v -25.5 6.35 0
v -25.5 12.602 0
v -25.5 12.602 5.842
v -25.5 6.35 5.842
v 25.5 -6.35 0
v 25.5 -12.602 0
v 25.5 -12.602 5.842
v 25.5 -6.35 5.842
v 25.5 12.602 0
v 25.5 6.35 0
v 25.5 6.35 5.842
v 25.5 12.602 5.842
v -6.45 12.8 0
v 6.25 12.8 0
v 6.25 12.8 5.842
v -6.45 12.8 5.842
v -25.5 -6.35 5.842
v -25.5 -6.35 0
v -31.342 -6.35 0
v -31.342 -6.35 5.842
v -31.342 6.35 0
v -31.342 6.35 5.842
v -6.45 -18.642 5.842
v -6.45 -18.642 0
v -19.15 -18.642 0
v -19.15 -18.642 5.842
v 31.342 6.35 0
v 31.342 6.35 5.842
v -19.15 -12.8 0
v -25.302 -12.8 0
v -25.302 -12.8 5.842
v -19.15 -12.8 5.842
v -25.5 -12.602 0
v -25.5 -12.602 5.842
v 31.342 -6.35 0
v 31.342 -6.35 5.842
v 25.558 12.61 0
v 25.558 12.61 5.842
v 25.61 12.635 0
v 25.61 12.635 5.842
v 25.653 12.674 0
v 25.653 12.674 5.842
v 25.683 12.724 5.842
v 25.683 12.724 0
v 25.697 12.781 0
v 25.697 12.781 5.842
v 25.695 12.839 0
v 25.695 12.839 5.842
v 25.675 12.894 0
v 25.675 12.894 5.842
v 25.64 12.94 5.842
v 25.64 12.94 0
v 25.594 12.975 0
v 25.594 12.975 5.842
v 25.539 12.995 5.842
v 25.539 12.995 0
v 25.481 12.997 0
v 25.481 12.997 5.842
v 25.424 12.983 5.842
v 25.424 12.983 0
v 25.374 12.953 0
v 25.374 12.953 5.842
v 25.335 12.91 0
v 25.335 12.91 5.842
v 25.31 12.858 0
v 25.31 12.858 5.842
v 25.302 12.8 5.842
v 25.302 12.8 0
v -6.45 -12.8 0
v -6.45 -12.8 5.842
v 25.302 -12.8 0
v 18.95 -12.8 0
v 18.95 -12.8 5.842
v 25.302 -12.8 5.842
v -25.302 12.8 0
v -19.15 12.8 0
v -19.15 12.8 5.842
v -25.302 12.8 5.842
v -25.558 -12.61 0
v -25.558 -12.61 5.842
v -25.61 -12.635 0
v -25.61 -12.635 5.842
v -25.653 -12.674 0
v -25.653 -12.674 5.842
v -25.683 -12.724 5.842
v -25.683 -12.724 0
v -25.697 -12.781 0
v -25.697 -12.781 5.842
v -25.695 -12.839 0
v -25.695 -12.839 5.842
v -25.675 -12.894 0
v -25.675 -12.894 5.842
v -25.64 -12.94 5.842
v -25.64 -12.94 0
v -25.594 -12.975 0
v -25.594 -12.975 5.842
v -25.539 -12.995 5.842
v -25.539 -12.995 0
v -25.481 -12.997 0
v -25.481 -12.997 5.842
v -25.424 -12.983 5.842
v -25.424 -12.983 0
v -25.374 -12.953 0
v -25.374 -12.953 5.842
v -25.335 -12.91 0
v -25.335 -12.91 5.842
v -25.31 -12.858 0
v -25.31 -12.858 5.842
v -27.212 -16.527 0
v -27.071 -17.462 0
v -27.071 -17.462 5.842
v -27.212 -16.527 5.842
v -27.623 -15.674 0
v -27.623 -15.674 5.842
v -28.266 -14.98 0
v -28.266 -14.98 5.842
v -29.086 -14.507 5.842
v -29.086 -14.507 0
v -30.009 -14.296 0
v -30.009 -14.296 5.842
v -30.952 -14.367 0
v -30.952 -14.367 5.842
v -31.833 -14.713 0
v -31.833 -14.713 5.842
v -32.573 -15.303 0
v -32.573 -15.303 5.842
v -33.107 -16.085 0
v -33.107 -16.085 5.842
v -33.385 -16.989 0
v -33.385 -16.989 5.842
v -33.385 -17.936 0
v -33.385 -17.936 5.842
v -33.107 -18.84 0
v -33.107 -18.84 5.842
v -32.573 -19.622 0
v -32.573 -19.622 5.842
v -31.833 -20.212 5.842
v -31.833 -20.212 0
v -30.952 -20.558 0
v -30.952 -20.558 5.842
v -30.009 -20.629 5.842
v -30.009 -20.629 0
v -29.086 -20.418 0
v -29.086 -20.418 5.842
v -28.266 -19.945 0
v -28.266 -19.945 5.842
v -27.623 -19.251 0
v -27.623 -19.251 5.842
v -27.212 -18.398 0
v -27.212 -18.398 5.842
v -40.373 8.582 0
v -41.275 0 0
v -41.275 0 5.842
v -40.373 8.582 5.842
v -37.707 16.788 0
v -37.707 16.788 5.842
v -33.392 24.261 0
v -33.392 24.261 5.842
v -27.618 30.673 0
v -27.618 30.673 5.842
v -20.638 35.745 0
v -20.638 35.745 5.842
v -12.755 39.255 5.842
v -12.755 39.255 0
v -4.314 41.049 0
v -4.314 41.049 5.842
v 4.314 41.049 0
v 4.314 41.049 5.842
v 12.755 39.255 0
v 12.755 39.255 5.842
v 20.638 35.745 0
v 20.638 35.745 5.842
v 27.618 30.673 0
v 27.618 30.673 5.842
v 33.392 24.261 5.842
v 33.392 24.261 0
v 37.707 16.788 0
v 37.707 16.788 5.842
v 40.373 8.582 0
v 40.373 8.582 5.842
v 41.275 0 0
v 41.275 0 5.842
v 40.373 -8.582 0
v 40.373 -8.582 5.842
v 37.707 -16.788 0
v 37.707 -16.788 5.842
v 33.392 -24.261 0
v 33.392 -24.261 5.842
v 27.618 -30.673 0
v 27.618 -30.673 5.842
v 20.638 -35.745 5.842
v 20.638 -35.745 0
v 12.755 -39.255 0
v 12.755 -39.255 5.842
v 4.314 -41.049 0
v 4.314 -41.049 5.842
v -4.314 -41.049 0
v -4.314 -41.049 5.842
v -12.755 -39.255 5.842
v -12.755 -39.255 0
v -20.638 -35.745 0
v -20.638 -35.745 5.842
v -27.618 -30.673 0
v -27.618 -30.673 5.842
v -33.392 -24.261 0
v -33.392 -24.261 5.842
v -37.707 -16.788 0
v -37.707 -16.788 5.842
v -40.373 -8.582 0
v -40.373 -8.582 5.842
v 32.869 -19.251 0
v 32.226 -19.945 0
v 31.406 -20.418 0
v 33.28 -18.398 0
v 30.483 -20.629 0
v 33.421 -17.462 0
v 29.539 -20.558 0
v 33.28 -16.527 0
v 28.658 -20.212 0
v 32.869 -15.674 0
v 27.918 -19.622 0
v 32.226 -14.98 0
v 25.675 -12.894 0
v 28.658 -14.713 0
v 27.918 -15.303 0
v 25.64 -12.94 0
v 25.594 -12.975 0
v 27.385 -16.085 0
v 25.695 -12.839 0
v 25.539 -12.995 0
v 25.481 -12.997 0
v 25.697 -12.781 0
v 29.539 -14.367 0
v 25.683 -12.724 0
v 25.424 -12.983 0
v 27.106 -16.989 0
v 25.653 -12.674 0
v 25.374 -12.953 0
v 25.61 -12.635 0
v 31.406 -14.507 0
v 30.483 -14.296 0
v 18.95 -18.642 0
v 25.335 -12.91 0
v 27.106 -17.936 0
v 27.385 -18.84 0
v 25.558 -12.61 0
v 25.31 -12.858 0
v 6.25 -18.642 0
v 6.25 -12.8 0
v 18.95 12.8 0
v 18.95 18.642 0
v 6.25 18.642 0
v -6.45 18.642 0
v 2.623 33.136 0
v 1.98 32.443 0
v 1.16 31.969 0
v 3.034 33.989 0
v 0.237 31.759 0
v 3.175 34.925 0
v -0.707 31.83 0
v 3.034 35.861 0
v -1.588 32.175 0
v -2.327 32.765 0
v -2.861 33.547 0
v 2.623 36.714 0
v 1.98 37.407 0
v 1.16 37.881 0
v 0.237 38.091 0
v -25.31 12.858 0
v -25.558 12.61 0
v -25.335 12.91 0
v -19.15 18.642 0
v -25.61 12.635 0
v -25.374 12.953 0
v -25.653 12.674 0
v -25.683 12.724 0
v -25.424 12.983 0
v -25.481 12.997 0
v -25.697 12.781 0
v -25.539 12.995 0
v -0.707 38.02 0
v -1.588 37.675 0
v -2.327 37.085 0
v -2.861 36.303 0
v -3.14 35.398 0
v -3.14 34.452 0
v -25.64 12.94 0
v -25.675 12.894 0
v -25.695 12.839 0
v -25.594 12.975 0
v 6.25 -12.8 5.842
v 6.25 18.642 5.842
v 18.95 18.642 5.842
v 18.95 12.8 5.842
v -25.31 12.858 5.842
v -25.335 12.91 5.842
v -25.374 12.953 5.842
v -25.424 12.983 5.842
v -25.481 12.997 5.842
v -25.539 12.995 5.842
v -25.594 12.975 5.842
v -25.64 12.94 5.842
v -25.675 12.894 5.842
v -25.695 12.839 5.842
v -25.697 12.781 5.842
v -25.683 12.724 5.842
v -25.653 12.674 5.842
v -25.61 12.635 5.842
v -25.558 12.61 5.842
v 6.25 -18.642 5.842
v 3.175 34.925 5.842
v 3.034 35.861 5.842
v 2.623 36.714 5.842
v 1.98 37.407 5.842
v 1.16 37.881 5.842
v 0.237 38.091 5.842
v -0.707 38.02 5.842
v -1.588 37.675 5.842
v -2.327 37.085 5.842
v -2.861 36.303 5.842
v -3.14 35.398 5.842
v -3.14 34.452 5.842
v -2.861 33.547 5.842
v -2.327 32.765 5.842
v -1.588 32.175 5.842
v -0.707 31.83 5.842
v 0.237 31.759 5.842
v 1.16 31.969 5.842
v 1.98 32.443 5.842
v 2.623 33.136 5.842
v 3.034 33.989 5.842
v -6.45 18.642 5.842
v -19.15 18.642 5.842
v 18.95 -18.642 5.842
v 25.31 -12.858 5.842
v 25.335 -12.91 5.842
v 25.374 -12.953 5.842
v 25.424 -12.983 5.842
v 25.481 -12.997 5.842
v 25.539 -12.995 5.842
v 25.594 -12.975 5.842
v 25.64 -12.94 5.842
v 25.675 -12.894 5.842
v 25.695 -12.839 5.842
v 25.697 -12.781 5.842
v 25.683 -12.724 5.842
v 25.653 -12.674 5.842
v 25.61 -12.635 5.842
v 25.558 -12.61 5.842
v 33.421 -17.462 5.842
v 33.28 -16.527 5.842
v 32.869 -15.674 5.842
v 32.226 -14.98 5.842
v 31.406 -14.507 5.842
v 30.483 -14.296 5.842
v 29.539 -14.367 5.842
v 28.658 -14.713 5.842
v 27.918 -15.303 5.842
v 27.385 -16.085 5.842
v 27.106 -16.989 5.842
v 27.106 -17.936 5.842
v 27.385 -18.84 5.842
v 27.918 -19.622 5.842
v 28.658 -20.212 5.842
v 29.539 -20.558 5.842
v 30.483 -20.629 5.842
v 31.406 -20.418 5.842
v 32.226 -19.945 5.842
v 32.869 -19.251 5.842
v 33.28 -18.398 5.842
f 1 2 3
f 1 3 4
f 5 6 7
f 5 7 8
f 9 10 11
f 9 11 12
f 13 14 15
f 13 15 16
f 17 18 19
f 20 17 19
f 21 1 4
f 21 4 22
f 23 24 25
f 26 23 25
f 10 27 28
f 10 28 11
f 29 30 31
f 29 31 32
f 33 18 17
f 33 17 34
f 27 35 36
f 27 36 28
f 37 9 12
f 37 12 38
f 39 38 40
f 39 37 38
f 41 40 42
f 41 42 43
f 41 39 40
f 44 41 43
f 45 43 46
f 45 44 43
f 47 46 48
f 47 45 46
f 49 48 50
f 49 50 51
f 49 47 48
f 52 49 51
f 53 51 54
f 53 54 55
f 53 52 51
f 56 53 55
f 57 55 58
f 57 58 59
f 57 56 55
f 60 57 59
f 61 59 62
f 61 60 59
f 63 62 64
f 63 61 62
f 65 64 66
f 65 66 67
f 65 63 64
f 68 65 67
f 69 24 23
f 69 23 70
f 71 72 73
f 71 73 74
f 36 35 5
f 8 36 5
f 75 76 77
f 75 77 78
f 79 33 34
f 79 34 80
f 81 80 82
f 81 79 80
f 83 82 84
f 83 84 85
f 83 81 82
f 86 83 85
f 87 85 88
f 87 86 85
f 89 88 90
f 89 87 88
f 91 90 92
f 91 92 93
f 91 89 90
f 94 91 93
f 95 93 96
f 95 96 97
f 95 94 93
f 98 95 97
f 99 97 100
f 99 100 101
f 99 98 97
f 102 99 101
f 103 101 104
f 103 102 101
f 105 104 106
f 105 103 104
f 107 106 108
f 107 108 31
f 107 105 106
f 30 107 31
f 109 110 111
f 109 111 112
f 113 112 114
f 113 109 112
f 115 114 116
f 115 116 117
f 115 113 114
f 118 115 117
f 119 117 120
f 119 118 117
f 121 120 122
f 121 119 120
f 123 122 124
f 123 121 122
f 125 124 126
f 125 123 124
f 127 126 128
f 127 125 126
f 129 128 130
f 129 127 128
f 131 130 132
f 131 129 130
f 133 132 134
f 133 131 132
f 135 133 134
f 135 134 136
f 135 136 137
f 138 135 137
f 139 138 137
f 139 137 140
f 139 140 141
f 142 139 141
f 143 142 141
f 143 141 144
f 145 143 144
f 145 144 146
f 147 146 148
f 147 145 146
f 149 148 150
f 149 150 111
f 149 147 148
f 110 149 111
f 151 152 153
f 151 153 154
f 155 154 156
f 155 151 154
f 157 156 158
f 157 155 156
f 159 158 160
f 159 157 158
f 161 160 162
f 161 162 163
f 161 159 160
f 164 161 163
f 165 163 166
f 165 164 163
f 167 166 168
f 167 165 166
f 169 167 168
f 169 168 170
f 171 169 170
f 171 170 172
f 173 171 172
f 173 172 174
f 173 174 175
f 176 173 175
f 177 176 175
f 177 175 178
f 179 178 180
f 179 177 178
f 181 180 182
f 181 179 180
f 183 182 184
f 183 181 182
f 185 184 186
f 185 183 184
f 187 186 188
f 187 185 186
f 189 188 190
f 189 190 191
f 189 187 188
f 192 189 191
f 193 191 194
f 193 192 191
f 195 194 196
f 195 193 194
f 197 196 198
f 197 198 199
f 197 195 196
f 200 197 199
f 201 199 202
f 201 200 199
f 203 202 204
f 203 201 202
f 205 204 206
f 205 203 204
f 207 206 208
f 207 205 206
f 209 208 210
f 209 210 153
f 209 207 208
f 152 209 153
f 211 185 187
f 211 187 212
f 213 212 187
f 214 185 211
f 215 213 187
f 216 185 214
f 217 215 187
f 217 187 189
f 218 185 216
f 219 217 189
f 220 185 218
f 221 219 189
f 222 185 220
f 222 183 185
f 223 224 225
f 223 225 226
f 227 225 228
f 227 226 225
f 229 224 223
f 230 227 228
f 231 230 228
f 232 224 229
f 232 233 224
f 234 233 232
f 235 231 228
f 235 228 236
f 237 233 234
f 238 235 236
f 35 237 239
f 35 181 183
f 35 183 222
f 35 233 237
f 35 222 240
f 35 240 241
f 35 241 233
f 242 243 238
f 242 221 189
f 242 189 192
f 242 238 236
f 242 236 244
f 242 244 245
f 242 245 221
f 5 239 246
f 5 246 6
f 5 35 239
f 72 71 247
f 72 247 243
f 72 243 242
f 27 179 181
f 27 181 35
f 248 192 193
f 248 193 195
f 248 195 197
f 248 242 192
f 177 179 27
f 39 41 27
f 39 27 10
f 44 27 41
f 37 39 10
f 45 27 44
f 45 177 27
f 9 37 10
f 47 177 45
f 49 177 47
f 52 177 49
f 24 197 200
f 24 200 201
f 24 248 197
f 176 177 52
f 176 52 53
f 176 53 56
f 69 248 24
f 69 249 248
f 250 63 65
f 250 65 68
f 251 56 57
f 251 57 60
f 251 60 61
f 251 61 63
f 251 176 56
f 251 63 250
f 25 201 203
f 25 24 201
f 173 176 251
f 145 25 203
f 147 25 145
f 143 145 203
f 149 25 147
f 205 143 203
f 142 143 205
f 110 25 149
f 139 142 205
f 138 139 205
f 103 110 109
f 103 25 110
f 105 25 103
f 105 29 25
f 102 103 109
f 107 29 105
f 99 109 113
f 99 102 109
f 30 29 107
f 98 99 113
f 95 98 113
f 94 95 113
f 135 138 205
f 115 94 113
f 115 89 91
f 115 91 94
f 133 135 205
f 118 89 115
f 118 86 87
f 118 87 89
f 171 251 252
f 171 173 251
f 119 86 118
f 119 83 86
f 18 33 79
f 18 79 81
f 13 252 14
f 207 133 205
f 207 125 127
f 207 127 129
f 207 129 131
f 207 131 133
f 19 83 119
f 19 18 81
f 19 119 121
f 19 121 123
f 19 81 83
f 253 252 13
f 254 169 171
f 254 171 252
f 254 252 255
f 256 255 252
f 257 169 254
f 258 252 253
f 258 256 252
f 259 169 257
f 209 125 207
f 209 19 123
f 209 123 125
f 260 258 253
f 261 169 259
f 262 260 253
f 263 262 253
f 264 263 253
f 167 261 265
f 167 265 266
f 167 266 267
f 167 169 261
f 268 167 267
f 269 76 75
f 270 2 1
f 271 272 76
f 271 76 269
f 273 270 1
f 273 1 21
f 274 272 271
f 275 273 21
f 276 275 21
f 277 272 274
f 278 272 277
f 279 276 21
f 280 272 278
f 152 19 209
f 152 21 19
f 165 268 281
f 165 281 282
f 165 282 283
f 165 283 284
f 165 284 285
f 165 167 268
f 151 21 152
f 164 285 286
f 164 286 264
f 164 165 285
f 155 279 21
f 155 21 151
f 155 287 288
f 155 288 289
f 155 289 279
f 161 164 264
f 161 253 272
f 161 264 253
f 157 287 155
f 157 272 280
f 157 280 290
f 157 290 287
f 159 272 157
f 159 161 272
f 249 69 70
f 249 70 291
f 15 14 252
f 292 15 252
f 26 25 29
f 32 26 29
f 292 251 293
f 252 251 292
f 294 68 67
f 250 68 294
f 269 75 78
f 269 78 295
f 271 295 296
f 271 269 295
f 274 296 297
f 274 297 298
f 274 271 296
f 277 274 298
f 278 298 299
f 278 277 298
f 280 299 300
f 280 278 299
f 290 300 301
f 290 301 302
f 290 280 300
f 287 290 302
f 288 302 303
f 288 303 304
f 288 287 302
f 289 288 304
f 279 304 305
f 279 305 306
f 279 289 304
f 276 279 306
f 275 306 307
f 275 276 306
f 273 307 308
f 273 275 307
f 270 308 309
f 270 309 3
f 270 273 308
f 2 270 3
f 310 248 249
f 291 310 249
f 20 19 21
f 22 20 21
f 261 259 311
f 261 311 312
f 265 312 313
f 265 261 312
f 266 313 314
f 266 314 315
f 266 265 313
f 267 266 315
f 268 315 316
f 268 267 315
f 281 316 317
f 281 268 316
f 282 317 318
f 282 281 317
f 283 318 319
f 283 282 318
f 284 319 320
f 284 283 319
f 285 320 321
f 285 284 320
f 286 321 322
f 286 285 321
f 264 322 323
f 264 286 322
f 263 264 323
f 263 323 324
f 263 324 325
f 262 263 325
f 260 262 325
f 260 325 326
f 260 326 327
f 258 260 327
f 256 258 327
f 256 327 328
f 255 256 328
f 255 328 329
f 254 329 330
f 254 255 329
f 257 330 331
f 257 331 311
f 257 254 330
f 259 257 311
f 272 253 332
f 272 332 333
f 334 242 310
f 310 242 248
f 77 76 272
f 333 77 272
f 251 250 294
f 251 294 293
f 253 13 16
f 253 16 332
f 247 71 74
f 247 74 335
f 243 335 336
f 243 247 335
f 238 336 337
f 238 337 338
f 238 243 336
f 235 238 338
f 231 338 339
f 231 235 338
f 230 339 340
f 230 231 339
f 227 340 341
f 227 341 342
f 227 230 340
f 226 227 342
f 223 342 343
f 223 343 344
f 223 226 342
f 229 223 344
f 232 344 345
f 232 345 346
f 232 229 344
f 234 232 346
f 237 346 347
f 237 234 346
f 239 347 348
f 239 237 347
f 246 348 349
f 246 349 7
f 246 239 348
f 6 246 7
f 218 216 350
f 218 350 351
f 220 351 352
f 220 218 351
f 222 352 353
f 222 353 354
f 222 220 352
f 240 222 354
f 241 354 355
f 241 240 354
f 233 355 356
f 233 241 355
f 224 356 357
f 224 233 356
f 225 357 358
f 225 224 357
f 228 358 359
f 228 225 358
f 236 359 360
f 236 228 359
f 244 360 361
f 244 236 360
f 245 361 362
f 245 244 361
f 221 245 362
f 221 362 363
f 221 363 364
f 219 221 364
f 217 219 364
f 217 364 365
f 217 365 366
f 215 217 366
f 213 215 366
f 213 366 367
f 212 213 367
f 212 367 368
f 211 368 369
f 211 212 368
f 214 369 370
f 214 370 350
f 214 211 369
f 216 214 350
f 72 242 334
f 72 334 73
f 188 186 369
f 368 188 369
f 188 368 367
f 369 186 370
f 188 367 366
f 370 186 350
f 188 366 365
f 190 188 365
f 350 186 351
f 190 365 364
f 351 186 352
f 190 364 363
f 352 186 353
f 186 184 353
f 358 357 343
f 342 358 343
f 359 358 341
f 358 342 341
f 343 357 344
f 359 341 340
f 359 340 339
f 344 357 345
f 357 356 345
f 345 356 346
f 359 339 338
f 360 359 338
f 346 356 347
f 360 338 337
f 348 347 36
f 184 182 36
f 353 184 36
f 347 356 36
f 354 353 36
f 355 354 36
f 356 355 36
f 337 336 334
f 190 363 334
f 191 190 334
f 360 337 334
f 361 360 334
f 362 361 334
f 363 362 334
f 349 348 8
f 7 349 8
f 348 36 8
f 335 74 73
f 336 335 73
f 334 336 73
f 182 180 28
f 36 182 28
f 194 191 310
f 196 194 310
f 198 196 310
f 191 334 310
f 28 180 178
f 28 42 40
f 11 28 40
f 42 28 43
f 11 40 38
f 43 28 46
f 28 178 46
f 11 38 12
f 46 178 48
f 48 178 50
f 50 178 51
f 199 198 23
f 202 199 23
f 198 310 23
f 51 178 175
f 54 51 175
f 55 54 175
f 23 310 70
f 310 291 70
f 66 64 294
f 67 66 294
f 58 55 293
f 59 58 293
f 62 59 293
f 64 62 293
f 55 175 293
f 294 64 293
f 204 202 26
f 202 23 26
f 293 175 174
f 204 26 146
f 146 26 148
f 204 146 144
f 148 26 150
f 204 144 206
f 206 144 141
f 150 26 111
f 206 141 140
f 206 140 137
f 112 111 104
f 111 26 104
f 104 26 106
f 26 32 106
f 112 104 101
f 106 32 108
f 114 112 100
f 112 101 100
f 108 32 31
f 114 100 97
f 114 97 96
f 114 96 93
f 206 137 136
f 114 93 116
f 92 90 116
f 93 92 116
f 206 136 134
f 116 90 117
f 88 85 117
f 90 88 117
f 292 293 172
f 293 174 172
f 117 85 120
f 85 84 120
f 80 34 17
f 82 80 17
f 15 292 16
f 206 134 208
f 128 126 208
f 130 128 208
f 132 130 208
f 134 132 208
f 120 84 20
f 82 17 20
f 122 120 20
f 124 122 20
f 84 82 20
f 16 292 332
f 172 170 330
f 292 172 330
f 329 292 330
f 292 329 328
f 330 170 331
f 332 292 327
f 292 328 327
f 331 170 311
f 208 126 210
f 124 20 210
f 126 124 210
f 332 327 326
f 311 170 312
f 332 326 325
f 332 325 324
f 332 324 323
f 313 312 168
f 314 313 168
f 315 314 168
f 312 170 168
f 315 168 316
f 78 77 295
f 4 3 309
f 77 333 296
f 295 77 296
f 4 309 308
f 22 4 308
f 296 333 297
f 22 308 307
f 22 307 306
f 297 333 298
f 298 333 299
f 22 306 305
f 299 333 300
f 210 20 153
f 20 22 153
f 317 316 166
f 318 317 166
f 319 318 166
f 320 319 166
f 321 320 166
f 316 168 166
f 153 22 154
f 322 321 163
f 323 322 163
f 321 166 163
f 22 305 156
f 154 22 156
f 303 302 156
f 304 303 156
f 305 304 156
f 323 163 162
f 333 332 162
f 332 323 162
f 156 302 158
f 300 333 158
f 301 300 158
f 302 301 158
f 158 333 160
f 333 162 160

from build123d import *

# Parameters (mm, degrees)
SKETCH1_R           = 41.275
SKETCH1_R_2         = 3.175
BOSS_EXTRUDE1_DEPTH = 5.842
SKETCH7_R           = 41.275
SKETCH7_R_2         = 39.487499946
CUT_EXTRUDE3_DEPTH  = 59.663278241
SKETCH8_W           = 5.842
SKETCH8_H           = 12.7
SKETCH8_W_2         = 12.7
SKETCH8_H_2         = 5.842
CUT_EXTRUDE4_DEPTH  = 57.148501921
SKETCH9_R           = 41.275
SKETCH9_R_2         = 39.487499946
BOSS_EXTRUDE2_DEPTH = 5.842


with BuildPart() as part:
    # Sketch1 → Boss-Extrude1 (new body)
    with BuildSketch(Plane.XY):
        Circle(SKETCH1_R)
        with Locations((0, 34.925)):
            Circle(SKETCH1_R_2, mode=Mode.SUBTRACT)
        with Locations((30.245937227, -17.4625)):
            Circle(SKETCH1_R_2, mode=Mode.SUBTRACT)
        with Locations((-30.245937227, -17.4625)):
            Circle(SKETCH1_R_2, mode=Mode.SUBTRACT)
        with BuildLine():
            Line((-25.3015625, -12.8), (25.3015625, -12.8))
            ThreePointArc((25.3015625, -12.8), (25.640316502, -12.940316502), (25.5, -12.6015625))
            Line((25.5, -12.6015625), (25.5, 12.6015625))
            ThreePointArc((25.5, 12.6015625), (25.640316502, 12.940316502), (25.3015625, 12.8))
            Line((25.3015625, 12.8), (-25.3015625, 12.8))
            ThreePointArc((-25.3015625, 12.8), (-25.640316502, 12.940316502), (-25.5, 12.6015625))
            Line((-25.5, 12.6015625), (-25.5, -12.6015625))
            ThreePointArc((-25.5, -12.6015625), (-25.640316502, -12.940316502), (-25.3015625, -12.8))
        make_face(mode=Mode.SUBTRACT)
    extrude(amount=BOSS_EXTRUDE1_DEPTH)

    # Sketch7 → Cut-Extrude3 (cut, through all)
    with BuildSketch(Plane(origin=(0, 0, 0), x_dir=(-1, 0, 0), z_dir=(0, 0, -1))):
        Circle(SKETCH7_R)
        Circle(SKETCH7_R_2, mode=Mode.SUBTRACT)
    extrude(amount=-CUT_EXTRUDE3_DEPTH, mode=Mode.SUBTRACT)

    # Sketch8 → Cut-Extrude4 (cut, through all)
    with BuildSketch(Plane(origin=(0, 0, 0), x_dir=(-1, 0, 0), z_dir=(0, 0, -1))):
        with Locations((-28.421, 0)):
            Rectangle(SKETCH8_W, SKETCH8_H)
        with Locations((-12.599996942, 15.721)):
            Rectangle(SKETCH8_W_2, SKETCH8_H_2)
        with Locations((12.800003058, 15.721)):
            Rectangle(SKETCH8_W_2, SKETCH8_H_2)
        with Locations((12.800003058, -15.721)):
            Rectangle(SKETCH8_W_2, SKETCH8_H_2)
        with Locations((-12.599996942, -15.721)):
            Rectangle(SKETCH8_W_2, SKETCH8_H_2)
        with Locations((28.421, 0)):
            Rectangle(SKETCH8_W, SKETCH8_H)
    extrude(amount=-CUT_EXTRUDE4_DEPTH, mode=Mode.SUBTRACT)

    # Sketch9 → Boss-Extrude2 (add)
    with BuildSketch(Plane(origin=(0, 0, 0), x_dir=(-1, 0, 0), z_dir=(0, 0, -1))):
        Circle(SKETCH9_R)
        Circle(SKETCH9_R_2, mode=Mode.SUBTRACT)
    extrude(amount=-BOSS_EXTRUDE2_DEPTH)


solid = part.part
